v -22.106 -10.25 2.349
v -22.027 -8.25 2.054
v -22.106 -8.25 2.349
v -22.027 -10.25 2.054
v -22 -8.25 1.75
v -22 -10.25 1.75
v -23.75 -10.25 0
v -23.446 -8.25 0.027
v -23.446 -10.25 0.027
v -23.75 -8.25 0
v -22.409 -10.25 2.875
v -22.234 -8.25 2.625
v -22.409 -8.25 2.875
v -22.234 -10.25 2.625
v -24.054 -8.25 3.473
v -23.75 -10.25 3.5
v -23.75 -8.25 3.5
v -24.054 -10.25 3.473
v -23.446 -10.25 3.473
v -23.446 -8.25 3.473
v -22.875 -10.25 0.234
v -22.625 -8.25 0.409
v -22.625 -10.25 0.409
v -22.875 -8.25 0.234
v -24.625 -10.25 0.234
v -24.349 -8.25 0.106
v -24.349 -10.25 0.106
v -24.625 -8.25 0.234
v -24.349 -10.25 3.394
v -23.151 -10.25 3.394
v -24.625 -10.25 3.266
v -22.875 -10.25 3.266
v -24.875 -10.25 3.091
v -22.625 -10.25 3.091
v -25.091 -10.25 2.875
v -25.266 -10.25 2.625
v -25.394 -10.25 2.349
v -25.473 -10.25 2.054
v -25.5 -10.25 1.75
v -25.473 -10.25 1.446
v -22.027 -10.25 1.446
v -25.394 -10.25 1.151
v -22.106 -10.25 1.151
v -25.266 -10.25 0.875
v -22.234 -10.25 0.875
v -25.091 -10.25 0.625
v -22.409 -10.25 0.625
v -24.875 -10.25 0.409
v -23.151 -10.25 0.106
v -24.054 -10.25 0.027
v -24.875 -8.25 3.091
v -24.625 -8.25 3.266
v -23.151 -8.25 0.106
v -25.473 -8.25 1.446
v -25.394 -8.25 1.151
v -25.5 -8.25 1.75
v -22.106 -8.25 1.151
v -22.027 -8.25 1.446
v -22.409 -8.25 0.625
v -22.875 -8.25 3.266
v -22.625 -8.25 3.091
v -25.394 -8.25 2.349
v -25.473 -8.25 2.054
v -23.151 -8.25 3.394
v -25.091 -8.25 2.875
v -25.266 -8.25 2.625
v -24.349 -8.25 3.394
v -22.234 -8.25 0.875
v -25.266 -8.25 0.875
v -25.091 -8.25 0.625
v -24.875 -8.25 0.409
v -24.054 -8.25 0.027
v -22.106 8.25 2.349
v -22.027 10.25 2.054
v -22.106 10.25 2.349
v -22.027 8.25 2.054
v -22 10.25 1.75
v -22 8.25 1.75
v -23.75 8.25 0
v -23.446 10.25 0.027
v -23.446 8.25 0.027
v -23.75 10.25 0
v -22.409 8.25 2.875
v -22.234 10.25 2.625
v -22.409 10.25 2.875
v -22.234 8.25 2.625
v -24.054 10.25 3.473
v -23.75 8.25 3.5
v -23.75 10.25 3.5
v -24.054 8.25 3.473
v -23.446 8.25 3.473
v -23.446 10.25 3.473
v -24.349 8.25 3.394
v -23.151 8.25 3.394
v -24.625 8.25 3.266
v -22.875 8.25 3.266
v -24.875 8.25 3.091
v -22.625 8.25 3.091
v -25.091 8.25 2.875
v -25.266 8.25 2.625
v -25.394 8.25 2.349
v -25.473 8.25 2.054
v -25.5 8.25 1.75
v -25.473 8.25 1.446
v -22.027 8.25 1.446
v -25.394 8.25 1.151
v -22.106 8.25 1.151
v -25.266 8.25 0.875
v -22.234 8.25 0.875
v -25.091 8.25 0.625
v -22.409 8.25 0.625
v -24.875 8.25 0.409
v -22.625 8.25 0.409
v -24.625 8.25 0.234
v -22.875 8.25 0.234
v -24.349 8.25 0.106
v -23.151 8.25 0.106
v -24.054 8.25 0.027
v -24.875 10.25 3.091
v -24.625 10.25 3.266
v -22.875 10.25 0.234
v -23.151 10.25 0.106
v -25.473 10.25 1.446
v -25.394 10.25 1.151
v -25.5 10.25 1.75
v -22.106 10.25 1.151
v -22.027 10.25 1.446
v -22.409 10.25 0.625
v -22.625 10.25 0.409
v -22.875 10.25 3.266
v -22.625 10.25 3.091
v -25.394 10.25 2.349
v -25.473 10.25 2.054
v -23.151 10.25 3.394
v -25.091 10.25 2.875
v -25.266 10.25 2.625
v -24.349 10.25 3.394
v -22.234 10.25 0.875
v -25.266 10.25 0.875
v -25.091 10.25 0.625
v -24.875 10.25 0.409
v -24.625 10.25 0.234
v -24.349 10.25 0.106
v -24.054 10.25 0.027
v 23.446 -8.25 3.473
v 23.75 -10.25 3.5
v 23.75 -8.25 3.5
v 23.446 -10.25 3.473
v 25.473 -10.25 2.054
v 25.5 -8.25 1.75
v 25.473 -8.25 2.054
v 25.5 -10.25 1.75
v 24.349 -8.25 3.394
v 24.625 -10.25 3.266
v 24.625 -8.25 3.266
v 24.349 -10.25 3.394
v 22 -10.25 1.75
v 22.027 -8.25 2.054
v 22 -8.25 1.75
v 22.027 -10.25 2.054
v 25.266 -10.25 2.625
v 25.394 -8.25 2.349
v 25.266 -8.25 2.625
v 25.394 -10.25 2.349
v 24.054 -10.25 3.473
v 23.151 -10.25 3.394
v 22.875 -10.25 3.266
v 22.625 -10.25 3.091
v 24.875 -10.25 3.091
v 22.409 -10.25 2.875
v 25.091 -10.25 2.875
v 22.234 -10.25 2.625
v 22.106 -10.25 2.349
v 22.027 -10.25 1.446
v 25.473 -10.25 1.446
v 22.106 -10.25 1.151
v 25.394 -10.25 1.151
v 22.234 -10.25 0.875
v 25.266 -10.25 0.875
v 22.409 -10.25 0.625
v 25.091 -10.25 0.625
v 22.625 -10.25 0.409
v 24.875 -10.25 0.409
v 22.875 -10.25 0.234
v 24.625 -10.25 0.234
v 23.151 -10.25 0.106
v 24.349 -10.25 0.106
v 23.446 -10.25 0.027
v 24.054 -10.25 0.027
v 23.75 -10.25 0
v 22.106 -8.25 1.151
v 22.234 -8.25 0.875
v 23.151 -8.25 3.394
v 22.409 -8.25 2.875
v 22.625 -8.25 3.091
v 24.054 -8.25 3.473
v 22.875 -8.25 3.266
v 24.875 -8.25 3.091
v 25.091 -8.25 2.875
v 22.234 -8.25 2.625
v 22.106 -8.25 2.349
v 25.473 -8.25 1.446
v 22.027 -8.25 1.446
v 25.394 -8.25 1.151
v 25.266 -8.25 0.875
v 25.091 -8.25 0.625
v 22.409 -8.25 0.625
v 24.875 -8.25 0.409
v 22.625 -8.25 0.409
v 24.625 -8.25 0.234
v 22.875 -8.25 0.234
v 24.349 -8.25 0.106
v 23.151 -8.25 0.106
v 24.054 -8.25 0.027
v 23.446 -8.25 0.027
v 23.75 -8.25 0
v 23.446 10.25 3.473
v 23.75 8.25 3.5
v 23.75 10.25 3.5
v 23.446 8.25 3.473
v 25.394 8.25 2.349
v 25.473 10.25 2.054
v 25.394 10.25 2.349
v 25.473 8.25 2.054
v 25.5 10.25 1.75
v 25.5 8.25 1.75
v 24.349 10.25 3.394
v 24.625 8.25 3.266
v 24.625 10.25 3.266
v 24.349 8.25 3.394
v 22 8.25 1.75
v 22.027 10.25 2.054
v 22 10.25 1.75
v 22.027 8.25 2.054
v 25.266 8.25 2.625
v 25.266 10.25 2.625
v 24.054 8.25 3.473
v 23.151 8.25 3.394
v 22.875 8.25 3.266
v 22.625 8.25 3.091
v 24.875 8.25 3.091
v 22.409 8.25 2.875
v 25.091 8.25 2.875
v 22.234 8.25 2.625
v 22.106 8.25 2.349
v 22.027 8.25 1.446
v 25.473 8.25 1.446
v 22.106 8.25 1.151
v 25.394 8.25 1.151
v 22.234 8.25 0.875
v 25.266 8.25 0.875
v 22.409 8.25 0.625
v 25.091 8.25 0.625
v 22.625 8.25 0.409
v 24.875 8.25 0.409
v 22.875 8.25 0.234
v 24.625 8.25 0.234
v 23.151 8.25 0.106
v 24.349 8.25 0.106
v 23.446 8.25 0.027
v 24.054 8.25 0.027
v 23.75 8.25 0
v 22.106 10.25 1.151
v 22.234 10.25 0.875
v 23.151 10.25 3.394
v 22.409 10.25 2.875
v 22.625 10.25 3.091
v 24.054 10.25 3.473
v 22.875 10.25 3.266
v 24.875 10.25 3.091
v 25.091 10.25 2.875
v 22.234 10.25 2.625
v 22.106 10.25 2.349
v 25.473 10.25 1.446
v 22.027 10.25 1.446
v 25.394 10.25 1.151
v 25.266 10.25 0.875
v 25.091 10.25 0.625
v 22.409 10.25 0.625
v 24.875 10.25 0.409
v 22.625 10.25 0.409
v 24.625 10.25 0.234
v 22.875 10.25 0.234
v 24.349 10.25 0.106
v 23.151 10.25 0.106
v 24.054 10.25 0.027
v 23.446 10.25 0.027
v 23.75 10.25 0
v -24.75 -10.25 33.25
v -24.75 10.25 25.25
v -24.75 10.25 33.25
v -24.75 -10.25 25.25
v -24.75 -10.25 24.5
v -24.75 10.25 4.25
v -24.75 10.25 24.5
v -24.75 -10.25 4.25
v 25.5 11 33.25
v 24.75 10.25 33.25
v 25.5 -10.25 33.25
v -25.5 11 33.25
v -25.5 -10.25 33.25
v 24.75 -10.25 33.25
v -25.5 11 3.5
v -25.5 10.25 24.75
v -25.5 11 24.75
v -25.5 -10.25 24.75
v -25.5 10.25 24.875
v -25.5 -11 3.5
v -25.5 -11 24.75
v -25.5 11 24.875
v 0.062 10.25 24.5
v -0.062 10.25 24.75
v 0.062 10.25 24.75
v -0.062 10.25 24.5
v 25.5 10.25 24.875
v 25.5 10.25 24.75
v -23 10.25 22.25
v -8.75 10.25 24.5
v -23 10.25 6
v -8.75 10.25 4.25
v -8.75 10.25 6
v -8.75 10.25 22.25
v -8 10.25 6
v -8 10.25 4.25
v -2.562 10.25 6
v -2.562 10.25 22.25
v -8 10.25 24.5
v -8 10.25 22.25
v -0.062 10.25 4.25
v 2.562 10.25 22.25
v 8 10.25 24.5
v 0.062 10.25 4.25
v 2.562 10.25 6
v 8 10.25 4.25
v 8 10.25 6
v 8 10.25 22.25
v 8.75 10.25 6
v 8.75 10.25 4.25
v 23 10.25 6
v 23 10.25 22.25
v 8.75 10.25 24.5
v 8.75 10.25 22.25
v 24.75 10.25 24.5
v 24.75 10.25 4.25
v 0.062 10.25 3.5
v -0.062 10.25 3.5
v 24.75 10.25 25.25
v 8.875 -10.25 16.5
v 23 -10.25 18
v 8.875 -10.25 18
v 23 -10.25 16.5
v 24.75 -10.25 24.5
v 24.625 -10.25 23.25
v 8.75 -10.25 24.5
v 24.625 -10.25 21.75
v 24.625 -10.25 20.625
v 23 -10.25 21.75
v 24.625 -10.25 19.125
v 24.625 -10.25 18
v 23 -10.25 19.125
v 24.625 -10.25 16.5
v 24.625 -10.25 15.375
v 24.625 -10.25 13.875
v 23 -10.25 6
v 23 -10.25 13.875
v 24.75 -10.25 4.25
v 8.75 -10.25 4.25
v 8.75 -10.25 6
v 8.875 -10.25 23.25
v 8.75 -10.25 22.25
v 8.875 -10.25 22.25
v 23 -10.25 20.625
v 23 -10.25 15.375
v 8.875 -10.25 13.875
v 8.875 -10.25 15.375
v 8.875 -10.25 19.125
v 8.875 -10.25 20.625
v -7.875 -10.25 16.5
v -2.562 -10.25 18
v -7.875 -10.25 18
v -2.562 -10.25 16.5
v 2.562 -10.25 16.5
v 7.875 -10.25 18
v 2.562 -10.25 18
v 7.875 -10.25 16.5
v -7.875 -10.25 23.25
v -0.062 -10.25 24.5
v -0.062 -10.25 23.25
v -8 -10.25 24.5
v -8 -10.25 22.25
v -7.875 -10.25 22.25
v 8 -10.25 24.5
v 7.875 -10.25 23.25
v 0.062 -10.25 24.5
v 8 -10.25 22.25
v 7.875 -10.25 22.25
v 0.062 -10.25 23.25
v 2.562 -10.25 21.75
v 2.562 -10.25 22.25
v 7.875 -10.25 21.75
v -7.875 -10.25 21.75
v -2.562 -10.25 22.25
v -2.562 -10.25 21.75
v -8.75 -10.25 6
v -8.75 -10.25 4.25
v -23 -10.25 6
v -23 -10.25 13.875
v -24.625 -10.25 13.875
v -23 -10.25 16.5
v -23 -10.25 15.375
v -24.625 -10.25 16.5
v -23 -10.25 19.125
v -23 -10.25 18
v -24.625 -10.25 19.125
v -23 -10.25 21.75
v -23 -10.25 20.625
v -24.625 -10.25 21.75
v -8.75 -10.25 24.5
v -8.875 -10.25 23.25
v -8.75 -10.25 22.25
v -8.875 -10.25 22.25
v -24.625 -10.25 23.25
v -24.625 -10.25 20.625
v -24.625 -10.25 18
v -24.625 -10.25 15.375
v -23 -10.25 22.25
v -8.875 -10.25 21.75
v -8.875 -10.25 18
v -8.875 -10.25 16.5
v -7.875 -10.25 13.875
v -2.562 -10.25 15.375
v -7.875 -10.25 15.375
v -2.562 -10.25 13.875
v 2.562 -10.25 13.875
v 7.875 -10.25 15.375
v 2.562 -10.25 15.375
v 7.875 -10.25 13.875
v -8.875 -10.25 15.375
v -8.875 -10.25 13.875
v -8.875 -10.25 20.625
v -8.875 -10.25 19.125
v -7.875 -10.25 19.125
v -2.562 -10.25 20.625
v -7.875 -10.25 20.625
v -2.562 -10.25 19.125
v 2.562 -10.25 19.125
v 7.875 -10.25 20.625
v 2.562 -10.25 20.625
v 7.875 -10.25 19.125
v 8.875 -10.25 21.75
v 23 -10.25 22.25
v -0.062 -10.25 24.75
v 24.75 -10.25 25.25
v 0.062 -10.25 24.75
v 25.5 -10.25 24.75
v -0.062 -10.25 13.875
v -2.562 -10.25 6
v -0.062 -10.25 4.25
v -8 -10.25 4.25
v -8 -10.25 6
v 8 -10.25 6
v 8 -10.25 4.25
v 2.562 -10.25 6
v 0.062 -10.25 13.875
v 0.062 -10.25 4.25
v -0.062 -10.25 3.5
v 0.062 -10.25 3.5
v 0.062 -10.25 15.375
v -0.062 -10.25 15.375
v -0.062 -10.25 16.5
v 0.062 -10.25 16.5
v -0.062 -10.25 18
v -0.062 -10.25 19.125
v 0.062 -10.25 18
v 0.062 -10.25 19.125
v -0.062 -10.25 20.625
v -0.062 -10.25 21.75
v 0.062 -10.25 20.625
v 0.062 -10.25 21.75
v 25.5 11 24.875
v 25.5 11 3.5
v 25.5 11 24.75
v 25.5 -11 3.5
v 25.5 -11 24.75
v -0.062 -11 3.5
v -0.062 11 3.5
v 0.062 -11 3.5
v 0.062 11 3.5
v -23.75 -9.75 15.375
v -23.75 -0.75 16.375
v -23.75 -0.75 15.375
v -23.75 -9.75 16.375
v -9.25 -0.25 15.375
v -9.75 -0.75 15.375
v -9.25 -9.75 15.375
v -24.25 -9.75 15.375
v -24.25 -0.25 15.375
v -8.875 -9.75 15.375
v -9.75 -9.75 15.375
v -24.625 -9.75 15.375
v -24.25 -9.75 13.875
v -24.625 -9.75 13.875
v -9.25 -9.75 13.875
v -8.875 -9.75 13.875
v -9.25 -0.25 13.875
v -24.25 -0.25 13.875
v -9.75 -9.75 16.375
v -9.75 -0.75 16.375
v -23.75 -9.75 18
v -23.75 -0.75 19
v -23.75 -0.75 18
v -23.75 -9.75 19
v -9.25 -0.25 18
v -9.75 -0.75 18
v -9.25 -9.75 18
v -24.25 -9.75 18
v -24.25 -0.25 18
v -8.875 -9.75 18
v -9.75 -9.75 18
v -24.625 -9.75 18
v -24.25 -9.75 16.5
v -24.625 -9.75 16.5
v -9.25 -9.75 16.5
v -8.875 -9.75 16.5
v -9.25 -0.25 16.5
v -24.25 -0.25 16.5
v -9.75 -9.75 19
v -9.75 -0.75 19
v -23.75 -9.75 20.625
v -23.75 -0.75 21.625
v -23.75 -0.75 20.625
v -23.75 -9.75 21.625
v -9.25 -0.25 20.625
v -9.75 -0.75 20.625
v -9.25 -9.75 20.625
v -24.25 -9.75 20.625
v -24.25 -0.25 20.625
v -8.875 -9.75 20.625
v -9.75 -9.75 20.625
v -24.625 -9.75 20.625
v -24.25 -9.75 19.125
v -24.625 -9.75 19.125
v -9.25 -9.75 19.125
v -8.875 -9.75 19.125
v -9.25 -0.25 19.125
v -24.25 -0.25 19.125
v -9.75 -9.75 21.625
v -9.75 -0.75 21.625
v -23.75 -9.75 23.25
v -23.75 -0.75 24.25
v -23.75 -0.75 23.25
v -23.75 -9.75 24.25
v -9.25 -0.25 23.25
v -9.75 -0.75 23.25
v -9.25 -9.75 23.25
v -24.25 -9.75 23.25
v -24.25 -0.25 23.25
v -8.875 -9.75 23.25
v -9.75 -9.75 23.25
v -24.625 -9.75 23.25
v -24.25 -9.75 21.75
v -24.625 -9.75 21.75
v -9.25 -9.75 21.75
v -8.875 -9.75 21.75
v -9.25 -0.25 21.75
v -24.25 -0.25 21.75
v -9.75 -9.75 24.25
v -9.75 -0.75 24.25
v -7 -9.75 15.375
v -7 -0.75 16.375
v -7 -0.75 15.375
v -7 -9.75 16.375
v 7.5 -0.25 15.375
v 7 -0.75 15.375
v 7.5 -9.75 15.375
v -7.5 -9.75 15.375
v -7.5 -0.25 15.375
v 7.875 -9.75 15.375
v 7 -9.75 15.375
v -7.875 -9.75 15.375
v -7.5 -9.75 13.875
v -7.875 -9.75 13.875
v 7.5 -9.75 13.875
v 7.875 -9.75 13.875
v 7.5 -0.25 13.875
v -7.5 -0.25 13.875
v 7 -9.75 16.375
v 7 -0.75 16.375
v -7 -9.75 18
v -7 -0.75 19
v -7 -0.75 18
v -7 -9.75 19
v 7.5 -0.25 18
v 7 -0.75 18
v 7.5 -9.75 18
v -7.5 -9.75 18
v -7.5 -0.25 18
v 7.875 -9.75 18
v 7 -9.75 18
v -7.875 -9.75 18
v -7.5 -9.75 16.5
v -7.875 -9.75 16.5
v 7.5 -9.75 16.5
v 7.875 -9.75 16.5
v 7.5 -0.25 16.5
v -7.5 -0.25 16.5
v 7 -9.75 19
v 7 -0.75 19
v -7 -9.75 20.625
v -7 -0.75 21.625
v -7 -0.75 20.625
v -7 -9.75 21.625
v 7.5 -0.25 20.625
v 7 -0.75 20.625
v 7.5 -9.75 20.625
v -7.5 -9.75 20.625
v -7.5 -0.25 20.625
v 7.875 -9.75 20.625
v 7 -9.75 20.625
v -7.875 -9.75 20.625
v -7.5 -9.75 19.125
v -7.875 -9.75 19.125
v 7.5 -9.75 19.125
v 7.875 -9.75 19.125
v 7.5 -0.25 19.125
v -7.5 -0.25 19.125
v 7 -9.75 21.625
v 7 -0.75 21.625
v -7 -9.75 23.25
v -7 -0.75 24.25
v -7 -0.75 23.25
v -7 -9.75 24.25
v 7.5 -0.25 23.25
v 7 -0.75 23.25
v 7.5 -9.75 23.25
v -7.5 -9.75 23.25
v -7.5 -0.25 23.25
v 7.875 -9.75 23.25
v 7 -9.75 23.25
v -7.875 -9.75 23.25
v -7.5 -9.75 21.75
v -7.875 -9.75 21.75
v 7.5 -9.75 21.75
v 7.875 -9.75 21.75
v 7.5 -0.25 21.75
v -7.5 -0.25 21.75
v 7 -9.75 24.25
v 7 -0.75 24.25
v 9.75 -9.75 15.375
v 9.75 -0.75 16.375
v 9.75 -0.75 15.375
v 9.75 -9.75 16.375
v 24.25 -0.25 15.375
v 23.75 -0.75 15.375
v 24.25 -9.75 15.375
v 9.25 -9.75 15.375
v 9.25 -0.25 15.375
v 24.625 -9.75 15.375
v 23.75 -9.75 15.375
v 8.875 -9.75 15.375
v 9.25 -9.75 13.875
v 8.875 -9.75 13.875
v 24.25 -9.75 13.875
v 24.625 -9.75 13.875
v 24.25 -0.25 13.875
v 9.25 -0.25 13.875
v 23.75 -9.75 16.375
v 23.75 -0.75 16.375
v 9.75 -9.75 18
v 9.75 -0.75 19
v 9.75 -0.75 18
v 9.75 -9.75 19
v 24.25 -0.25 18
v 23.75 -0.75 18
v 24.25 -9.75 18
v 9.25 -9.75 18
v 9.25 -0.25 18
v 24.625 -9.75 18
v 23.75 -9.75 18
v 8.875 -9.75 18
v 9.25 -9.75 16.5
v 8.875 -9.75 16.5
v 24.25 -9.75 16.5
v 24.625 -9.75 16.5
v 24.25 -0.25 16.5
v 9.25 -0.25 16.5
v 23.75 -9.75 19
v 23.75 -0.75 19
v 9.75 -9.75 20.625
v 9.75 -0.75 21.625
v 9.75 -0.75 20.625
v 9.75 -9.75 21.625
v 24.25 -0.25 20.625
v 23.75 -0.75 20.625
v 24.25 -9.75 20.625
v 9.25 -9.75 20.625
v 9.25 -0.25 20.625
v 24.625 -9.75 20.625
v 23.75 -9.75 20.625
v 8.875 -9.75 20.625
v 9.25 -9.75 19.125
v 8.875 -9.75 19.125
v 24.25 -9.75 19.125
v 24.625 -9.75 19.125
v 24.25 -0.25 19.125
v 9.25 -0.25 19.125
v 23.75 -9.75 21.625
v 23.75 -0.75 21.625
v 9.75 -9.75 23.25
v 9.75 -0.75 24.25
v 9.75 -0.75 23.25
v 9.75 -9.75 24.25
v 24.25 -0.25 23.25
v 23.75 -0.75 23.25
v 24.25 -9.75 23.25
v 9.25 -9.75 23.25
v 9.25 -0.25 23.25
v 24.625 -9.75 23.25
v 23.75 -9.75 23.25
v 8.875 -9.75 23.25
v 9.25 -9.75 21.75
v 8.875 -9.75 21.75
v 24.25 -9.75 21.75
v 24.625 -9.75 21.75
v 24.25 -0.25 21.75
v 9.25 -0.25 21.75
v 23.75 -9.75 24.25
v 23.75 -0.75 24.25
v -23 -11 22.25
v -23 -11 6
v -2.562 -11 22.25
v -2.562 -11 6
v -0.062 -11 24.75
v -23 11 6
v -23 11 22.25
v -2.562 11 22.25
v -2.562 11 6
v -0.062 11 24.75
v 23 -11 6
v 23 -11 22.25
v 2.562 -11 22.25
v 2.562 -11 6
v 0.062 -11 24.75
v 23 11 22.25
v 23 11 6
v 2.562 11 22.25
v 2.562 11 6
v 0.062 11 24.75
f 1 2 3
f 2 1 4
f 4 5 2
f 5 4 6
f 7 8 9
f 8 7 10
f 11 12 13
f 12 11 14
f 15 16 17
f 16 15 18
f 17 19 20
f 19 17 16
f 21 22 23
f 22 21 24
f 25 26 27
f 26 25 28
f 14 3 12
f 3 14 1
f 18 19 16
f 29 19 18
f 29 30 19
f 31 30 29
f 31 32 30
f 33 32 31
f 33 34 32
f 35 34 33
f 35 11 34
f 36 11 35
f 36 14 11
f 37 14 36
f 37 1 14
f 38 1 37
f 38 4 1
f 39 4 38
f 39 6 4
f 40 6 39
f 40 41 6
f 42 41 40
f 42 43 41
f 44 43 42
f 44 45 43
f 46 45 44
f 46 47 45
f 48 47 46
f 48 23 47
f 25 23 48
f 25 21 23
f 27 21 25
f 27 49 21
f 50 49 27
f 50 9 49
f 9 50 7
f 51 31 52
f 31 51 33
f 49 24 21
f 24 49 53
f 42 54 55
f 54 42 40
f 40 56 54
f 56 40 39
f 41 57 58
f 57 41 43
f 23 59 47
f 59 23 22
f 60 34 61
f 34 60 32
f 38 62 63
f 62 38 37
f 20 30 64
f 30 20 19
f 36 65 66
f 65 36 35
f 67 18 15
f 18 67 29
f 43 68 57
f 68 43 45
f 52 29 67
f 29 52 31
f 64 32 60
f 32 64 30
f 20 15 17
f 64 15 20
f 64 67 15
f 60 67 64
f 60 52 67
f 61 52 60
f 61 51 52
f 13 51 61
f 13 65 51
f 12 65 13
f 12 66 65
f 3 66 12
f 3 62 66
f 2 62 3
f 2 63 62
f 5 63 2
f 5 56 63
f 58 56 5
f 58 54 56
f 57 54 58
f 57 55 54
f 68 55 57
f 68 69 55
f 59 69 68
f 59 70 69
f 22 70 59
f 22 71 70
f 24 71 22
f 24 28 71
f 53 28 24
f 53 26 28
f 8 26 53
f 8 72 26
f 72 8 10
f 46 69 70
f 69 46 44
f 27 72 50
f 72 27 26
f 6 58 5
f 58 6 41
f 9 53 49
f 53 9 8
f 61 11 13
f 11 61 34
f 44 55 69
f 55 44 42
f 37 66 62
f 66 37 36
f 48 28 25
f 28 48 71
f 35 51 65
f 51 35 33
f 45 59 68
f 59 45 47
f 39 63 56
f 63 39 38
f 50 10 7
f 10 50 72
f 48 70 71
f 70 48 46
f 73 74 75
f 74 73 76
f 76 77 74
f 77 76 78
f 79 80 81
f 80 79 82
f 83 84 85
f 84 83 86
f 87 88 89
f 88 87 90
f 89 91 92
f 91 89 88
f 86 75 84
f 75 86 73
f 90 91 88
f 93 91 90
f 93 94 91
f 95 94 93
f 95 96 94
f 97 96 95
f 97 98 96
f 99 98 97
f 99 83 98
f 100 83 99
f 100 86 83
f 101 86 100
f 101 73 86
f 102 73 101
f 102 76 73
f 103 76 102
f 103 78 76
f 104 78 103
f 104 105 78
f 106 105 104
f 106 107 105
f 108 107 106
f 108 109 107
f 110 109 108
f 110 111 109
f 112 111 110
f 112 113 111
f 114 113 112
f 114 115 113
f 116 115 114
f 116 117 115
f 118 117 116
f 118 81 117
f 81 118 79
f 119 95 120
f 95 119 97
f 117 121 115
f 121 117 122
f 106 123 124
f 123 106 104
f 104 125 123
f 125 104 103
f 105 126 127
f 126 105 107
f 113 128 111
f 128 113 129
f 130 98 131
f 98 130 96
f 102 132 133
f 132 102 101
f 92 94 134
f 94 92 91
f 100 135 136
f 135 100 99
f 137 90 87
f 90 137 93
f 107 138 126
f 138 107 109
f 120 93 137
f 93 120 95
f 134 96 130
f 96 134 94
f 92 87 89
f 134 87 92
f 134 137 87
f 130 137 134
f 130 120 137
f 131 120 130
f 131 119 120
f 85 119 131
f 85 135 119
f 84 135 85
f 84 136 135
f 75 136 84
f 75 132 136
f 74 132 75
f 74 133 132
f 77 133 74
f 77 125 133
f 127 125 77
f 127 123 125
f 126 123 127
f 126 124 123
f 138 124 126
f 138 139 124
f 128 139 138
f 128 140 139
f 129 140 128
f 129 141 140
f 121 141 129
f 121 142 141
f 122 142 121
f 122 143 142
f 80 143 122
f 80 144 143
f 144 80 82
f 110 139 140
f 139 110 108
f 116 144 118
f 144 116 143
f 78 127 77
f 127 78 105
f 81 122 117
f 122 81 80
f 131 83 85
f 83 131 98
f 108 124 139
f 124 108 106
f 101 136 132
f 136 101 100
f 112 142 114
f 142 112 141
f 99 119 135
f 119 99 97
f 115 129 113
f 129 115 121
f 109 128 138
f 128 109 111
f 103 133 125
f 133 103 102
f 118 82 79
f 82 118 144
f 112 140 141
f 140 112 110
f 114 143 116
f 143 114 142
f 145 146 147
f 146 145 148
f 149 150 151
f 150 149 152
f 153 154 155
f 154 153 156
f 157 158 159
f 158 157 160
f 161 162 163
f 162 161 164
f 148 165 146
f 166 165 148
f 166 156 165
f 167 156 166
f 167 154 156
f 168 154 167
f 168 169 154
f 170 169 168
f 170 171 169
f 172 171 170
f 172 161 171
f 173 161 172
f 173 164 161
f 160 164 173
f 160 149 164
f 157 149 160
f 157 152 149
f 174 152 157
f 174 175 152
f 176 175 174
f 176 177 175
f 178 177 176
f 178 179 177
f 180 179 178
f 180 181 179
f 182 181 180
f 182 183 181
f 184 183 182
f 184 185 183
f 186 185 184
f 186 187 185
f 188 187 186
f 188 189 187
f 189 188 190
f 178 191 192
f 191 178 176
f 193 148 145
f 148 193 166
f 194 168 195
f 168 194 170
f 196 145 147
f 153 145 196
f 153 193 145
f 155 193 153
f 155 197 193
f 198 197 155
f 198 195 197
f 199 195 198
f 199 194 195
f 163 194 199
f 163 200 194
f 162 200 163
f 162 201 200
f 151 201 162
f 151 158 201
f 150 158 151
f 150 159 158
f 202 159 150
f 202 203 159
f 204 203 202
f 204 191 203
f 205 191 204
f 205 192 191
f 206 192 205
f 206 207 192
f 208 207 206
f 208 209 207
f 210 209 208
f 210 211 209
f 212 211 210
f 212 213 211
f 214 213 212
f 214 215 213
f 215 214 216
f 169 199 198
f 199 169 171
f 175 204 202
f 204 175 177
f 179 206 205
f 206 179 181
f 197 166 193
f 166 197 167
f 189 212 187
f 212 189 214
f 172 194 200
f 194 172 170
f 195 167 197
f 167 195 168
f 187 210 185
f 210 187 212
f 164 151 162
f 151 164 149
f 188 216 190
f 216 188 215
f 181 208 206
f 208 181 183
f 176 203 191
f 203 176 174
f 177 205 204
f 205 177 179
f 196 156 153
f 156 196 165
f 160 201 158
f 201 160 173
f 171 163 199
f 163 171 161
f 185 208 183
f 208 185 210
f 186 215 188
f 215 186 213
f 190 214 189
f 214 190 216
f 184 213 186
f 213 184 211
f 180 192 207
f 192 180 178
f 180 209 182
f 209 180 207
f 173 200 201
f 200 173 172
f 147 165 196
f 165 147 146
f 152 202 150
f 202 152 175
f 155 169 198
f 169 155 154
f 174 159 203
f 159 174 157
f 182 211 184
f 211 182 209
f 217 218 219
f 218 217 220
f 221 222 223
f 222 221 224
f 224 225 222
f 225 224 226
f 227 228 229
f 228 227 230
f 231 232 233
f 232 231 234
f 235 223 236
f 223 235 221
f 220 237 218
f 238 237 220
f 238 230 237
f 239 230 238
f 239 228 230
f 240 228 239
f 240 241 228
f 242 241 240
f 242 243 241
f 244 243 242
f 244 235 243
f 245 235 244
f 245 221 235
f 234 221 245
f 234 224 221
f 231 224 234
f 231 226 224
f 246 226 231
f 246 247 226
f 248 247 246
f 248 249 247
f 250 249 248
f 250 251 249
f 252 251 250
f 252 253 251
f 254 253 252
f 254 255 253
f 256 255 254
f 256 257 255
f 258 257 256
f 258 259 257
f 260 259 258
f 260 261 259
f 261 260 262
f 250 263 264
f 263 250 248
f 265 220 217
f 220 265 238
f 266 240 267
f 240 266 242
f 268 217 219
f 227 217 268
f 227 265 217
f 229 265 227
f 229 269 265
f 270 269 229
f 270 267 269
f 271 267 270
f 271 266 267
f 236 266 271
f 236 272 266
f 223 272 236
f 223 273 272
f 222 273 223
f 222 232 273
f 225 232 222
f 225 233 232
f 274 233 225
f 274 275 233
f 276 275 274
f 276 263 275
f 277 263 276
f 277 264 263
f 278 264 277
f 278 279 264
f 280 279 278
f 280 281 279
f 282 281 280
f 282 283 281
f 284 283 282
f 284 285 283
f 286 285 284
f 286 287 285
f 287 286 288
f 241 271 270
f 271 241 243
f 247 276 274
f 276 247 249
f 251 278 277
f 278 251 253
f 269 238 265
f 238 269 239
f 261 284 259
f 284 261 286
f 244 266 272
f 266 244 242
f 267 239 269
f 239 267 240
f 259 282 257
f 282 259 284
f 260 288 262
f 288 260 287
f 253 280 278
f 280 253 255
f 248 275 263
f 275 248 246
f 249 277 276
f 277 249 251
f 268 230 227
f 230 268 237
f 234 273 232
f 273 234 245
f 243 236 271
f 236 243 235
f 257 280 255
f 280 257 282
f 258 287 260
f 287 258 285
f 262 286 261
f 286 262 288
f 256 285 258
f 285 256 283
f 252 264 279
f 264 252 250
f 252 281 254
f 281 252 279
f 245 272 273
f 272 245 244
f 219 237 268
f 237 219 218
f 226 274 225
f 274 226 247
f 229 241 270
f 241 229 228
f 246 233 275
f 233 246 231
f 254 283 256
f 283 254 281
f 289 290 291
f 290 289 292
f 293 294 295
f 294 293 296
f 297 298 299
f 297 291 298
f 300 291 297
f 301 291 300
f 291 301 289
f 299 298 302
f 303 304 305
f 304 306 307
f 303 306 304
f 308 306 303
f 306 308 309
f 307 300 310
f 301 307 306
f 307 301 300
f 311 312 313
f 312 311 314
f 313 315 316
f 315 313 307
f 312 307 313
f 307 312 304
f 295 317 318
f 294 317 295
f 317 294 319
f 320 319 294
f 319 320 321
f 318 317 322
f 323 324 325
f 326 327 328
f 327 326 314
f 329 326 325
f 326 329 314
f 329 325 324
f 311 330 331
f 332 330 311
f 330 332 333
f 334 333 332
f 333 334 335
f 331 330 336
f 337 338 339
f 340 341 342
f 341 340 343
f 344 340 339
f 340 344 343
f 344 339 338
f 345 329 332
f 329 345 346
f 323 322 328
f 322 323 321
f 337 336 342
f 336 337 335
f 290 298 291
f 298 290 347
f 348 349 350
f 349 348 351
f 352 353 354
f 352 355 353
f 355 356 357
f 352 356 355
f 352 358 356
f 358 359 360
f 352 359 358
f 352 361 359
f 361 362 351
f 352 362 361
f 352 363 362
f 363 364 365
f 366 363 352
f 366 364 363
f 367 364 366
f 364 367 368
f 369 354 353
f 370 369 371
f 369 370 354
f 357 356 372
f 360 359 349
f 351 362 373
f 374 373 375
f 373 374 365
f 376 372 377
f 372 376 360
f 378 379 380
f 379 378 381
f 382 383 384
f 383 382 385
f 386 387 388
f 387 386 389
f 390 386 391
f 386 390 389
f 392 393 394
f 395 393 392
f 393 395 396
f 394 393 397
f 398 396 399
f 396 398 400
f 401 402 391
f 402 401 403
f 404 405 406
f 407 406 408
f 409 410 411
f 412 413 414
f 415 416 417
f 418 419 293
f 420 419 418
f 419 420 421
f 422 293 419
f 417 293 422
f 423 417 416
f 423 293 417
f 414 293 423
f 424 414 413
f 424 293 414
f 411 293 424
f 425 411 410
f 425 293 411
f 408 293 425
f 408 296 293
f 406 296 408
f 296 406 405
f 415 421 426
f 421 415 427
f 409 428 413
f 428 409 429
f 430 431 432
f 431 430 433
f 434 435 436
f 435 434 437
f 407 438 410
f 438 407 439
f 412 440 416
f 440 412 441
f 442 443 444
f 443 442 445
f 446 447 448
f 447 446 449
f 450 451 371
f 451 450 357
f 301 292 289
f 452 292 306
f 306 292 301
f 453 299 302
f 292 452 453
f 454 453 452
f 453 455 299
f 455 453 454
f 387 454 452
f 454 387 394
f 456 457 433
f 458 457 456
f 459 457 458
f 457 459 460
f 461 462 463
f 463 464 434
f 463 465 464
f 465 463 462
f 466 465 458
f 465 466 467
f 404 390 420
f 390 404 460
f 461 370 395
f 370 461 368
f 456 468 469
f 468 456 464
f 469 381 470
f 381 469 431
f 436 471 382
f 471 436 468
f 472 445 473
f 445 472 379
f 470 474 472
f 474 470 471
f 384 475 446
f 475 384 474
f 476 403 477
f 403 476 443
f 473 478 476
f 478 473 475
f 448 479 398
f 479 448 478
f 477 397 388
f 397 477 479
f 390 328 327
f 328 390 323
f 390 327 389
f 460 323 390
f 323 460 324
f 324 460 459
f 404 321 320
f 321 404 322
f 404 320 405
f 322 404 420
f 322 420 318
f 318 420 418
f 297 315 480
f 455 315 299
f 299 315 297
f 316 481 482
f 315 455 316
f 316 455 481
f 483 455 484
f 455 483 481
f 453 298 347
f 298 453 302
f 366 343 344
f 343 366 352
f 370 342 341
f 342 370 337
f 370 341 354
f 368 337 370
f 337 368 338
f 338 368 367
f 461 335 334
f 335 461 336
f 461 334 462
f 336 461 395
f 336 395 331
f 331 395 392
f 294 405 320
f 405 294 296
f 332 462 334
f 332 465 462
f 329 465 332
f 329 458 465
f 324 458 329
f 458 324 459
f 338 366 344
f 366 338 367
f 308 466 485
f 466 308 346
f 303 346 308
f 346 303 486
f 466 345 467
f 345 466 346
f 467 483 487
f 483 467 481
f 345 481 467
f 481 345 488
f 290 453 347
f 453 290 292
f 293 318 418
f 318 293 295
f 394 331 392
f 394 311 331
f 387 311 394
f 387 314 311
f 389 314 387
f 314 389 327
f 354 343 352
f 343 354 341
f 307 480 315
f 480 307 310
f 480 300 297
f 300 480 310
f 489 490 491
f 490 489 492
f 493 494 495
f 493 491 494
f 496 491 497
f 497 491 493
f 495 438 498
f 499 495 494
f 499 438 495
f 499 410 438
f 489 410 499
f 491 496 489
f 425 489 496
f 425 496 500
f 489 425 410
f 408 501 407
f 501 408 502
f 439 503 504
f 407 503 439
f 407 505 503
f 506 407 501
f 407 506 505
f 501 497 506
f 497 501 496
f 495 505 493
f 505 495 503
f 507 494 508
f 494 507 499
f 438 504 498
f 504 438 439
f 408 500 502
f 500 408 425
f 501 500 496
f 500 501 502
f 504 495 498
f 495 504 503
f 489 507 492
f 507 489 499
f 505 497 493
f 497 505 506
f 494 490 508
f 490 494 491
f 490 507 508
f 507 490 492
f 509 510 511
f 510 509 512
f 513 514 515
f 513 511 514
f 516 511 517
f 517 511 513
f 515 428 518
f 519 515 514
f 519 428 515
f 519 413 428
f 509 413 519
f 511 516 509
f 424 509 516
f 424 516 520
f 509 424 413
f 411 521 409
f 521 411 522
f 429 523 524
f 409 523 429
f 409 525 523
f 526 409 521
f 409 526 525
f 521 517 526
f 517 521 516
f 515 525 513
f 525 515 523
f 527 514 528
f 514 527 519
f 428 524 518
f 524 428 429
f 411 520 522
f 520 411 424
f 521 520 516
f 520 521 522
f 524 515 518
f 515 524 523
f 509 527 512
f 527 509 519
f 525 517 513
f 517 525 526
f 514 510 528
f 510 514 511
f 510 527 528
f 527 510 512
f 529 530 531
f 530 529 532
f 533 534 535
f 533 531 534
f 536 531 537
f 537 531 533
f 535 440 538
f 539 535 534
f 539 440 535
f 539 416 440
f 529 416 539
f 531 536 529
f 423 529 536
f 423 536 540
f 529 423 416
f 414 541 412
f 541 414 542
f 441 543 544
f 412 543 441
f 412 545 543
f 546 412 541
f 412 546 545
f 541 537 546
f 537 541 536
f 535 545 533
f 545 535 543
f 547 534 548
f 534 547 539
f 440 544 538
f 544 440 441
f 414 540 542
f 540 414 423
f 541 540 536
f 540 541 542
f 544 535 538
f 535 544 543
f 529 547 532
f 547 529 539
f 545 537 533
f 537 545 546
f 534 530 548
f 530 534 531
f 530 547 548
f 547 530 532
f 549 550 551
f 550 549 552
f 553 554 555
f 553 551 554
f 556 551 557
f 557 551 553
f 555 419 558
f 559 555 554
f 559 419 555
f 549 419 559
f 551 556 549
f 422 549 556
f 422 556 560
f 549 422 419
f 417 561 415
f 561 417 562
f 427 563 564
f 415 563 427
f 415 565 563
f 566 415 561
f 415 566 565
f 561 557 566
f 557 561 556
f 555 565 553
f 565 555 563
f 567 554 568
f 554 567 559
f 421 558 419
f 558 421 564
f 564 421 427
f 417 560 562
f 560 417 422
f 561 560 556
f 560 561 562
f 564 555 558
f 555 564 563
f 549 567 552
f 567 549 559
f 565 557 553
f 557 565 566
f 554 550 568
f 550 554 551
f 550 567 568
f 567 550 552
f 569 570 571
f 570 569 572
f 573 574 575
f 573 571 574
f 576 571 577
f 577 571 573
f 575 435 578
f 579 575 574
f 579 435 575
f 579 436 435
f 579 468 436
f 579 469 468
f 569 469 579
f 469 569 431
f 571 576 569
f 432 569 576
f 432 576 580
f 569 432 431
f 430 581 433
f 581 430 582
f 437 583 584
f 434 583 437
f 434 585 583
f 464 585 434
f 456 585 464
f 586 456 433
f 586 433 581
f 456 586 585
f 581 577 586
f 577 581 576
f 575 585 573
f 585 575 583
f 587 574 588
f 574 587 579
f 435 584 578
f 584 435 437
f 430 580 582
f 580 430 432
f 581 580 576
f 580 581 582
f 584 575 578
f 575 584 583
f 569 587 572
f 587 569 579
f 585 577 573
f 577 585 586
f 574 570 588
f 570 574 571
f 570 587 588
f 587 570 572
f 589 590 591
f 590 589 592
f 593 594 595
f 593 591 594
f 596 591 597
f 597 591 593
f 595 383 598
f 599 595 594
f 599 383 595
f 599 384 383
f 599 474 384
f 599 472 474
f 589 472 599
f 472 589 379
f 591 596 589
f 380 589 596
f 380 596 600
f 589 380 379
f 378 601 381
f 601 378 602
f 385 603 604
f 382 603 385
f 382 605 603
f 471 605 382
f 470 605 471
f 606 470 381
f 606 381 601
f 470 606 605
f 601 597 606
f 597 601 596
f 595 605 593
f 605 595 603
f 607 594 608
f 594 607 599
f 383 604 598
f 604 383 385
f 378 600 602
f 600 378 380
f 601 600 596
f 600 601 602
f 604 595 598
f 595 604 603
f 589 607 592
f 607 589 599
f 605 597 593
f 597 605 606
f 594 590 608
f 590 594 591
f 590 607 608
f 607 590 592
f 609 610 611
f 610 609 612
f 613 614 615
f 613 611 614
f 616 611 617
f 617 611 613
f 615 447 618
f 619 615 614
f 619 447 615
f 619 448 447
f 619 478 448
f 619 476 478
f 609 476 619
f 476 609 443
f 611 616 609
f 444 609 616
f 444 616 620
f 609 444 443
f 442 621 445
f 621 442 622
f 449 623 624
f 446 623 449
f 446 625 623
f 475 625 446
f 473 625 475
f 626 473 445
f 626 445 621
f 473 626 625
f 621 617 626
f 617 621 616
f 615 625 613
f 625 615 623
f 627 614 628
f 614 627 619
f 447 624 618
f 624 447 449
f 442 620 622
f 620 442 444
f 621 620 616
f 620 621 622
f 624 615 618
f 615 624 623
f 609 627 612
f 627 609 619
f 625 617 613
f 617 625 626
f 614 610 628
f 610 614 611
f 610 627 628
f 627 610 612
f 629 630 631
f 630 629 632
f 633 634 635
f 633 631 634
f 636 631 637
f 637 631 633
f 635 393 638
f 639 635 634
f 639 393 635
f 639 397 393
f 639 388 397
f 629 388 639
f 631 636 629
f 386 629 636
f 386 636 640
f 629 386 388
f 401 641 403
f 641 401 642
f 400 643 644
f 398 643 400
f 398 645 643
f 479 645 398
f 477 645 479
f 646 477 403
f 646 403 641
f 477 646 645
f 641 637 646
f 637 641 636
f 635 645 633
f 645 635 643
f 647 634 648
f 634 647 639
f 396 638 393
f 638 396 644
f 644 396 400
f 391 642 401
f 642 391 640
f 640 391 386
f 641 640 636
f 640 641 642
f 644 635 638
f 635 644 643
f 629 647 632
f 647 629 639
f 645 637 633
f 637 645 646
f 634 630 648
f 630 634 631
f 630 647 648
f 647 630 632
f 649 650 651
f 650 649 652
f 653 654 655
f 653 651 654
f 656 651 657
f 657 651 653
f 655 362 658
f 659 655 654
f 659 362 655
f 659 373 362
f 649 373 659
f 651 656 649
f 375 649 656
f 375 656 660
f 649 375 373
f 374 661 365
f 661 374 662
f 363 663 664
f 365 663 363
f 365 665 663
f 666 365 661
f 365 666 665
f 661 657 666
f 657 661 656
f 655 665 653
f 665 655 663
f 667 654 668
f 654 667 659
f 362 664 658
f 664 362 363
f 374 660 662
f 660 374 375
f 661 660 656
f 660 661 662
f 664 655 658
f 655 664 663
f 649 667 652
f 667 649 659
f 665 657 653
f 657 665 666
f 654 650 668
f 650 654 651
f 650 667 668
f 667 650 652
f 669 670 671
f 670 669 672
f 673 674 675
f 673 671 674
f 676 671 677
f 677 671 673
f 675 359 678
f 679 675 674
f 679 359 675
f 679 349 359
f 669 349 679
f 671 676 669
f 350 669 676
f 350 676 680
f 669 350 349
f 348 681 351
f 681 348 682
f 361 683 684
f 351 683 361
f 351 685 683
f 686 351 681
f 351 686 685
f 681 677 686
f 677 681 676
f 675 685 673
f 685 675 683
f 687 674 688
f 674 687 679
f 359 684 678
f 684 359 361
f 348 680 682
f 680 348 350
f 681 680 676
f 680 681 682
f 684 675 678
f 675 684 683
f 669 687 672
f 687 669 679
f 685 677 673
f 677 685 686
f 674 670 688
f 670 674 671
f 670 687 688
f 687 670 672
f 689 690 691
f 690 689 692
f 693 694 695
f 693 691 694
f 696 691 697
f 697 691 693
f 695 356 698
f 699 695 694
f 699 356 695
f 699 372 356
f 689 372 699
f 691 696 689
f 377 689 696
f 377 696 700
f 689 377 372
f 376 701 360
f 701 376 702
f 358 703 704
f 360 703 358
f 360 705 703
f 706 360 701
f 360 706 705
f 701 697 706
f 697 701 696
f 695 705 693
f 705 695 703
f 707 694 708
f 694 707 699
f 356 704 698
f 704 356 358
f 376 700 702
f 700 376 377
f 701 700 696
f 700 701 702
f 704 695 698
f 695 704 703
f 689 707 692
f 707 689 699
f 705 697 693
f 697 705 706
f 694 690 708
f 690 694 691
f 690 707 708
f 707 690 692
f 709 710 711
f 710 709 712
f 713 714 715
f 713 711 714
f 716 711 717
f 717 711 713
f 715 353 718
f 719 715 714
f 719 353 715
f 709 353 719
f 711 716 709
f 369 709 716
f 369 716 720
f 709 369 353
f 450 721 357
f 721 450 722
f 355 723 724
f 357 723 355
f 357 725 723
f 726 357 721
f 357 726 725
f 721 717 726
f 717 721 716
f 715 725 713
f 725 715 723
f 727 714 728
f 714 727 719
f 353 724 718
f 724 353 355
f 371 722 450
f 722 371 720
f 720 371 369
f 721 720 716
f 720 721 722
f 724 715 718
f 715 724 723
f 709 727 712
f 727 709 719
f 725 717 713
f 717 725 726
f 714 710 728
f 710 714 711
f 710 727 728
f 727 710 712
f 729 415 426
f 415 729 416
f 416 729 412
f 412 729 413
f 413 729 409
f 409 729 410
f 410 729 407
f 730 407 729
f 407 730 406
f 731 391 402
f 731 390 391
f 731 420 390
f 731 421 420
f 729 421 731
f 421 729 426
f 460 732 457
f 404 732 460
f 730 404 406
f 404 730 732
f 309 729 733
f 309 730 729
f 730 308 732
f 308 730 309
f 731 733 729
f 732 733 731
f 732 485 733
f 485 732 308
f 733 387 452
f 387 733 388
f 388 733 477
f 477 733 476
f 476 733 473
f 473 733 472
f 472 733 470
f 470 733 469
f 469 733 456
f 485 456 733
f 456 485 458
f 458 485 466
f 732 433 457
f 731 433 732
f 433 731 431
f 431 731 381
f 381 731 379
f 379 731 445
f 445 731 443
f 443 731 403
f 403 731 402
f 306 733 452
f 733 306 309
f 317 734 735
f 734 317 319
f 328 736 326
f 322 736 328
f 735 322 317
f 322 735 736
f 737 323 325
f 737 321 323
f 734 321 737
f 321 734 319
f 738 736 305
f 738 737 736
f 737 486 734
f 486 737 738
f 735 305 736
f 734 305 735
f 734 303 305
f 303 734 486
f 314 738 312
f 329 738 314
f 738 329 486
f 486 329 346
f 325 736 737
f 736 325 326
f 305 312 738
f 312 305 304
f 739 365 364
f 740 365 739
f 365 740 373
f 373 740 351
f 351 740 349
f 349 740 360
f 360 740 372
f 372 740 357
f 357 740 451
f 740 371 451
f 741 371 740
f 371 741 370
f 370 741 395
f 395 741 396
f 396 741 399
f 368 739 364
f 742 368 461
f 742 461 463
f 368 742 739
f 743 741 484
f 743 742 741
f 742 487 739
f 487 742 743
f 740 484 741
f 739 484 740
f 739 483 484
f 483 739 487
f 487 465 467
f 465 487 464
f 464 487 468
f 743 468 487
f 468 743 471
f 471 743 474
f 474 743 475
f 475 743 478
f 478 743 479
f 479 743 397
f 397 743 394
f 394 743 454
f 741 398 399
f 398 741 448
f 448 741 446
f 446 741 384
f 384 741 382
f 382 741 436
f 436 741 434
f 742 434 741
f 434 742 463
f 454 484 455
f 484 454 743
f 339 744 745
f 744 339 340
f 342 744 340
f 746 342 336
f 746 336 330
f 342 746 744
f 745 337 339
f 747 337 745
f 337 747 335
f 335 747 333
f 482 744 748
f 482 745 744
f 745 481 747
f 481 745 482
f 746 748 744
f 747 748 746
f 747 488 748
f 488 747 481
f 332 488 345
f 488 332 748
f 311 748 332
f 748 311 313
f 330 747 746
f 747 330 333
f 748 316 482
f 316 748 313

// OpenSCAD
// file: compartment_organizer.scad
function compartment_organizer_w() = 14;
function compartment_organizer_d() = 9;
function compartment_organizer_h() = 2;

module compartment_organizer() {
  color("orange", 0.5)
  cube(size=[
      compartment_organizer_w(),
      compartment_organizer_d(),
      compartment_organizer_h()],
    center=true);
}

compartment_organizer();
// main file
use <compartment_organizer.scad>;

drawer_slide_t = 1/2;
drawer_slide_w = 1;

caster_h = 3.5;

overall_h = 34;
overall_d = 22;

top_shelf_height = 8;

d_s = 1/8; // spacing between drawers and other stuff
d_t = 1/2; // drawer material thickness
d_w = compartment_organizer_w() + d_t * 2 + drawer_slide_t * 2;
d_d = compartment_organizer_d() + d_t * 2;
d_h1 = 1.5;
d_h = d_t + compartment_organizer_h();

c_t = 3/4; // carcass plywood thickness
c_d = overall_d - c_t * 2;
c_w = 3 * d_w + 4 * c_t;
c_h = overall_h - caster_h - c_t; // total carcass height
c_outside_h = c_h - c_t / 2; // outside panel height
c_inside_h = c_h - top_shelf_height - c_t; // height of inside panels

door_h = c_h - d_s - top_shelf_height - c_t/2;
door_w = c_w / 2 - d_s / 2;
door_strip_w = 2.5;

module _caster() {
  color("black")
  rotate([90, 0, 0])
    cylinder(r=caster_h/2, h=2, center=true, $fn=36);
}

module _drawer_assembly() {
  translate([0, d_d / 2, 0]) {
    color("GreenYellow")
    translate([0, -d_d / 2 + d_t / 2, d_h1/2])
      cube(size=[d_w - d_s * 2, d_t, d_h1], center=true);

    color("tan")
    translate([0, 0, d_t/2])
      cube(size=[compartment_organizer_w() + d_t,
        compartment_organizer_d() + d_t, d_t], center=true);

    for (x=[-1,1]) {
      translate([x * (d_w / 2 - drawer_slide_t - d_t / 2), 0, d_h1 / 2])
        cube(size=[d_t, d_d - d_t, d_h1], center=true);
    }

    color("GreenYellow")
    translate([0, d_d / 2 - d_t / 2, d_h1/2])
      cube(size=[d_w - 2 * drawer_slide_t, d_t, d_h1], center=true);

    translate([0, 0, compartment_organizer_h() / 2 + d_t])
      compartment_organizer();
  }
}

module carcass() {
  translate([0, 0, c_t/2])
    cube(size=[c_w, c_d, c_t], center=true);

  color("CadetBlue")
  for (x=[-1,1]) {
    translate([x * (c_w / 2 - c_t / 2), 0, c_t/2 + c_outside_h/2])
      cube(size=[c_t, c_d, c_outside_h], center=true);

    translate([x * (d_w / 2 + c_t / 2), 0, c_t/2 + c_inside_h/2])
      cube(size=[c_t, c_d, c_inside_h], center=true);
  }

  color("Cyan")
  translate([0, 0, c_h - top_shelf_height - c_t / 2])
    cube(size=[c_w  - c_t, c_d, c_t], center=true);

  rear_panel_h = top_shelf_height + c_t/2;
  rear_panel_w = c_w;
  color("SlateBlue")
  translate([0, c_d/2 + c_t/2, c_h - rear_panel_h/2]) 
    cube(size=[c_w, c_t, rear_panel_h], center=true);
}

module door() {
  translate([door_w / 2, -c_t/2, door_h/2]) 
  for (a=[-1,1]) {
    color("RosyBrown")
    translate([a * (door_w / 2 - door_strip_w / 2), 0, 0]) 
      cube(size=[door_strip_w, c_t, door_h - 2 * door_strip_w], center=true);

    color("Goldenrod")
    translate([0, 0, a * (door_h / 2 - door_strip_w / 2)]) 
      cube(size=[door_w, c_t, door_strip_w], center=true);
  }
}

module assembled() {
  for (x=[-1,1], y=[-1,1]) {
    translate([x * (c_w / 2 - caster_h / 2), y * (overall_d / 2 - caster_h/2), caster_h / 2])
      _caster();
  }

  translate([0, 0, caster_h]) 
    carcass();

  translate([0, 0, c_inside_h + c_t]) 
  for (x=[-1:1], z=[-3:0]) {
    translate([x * (d_w + c_t), -c_d/2, z * (d_h + d_s)])
      _drawer_assembly();
  }
  
  for (x=[-1,1], y=[-1,1]) {
    translate([x * (c_w/2), y * (c_d/2), caster_h]) 
      scale([-x, -y, 1]) door();
  }

}


assembled();
